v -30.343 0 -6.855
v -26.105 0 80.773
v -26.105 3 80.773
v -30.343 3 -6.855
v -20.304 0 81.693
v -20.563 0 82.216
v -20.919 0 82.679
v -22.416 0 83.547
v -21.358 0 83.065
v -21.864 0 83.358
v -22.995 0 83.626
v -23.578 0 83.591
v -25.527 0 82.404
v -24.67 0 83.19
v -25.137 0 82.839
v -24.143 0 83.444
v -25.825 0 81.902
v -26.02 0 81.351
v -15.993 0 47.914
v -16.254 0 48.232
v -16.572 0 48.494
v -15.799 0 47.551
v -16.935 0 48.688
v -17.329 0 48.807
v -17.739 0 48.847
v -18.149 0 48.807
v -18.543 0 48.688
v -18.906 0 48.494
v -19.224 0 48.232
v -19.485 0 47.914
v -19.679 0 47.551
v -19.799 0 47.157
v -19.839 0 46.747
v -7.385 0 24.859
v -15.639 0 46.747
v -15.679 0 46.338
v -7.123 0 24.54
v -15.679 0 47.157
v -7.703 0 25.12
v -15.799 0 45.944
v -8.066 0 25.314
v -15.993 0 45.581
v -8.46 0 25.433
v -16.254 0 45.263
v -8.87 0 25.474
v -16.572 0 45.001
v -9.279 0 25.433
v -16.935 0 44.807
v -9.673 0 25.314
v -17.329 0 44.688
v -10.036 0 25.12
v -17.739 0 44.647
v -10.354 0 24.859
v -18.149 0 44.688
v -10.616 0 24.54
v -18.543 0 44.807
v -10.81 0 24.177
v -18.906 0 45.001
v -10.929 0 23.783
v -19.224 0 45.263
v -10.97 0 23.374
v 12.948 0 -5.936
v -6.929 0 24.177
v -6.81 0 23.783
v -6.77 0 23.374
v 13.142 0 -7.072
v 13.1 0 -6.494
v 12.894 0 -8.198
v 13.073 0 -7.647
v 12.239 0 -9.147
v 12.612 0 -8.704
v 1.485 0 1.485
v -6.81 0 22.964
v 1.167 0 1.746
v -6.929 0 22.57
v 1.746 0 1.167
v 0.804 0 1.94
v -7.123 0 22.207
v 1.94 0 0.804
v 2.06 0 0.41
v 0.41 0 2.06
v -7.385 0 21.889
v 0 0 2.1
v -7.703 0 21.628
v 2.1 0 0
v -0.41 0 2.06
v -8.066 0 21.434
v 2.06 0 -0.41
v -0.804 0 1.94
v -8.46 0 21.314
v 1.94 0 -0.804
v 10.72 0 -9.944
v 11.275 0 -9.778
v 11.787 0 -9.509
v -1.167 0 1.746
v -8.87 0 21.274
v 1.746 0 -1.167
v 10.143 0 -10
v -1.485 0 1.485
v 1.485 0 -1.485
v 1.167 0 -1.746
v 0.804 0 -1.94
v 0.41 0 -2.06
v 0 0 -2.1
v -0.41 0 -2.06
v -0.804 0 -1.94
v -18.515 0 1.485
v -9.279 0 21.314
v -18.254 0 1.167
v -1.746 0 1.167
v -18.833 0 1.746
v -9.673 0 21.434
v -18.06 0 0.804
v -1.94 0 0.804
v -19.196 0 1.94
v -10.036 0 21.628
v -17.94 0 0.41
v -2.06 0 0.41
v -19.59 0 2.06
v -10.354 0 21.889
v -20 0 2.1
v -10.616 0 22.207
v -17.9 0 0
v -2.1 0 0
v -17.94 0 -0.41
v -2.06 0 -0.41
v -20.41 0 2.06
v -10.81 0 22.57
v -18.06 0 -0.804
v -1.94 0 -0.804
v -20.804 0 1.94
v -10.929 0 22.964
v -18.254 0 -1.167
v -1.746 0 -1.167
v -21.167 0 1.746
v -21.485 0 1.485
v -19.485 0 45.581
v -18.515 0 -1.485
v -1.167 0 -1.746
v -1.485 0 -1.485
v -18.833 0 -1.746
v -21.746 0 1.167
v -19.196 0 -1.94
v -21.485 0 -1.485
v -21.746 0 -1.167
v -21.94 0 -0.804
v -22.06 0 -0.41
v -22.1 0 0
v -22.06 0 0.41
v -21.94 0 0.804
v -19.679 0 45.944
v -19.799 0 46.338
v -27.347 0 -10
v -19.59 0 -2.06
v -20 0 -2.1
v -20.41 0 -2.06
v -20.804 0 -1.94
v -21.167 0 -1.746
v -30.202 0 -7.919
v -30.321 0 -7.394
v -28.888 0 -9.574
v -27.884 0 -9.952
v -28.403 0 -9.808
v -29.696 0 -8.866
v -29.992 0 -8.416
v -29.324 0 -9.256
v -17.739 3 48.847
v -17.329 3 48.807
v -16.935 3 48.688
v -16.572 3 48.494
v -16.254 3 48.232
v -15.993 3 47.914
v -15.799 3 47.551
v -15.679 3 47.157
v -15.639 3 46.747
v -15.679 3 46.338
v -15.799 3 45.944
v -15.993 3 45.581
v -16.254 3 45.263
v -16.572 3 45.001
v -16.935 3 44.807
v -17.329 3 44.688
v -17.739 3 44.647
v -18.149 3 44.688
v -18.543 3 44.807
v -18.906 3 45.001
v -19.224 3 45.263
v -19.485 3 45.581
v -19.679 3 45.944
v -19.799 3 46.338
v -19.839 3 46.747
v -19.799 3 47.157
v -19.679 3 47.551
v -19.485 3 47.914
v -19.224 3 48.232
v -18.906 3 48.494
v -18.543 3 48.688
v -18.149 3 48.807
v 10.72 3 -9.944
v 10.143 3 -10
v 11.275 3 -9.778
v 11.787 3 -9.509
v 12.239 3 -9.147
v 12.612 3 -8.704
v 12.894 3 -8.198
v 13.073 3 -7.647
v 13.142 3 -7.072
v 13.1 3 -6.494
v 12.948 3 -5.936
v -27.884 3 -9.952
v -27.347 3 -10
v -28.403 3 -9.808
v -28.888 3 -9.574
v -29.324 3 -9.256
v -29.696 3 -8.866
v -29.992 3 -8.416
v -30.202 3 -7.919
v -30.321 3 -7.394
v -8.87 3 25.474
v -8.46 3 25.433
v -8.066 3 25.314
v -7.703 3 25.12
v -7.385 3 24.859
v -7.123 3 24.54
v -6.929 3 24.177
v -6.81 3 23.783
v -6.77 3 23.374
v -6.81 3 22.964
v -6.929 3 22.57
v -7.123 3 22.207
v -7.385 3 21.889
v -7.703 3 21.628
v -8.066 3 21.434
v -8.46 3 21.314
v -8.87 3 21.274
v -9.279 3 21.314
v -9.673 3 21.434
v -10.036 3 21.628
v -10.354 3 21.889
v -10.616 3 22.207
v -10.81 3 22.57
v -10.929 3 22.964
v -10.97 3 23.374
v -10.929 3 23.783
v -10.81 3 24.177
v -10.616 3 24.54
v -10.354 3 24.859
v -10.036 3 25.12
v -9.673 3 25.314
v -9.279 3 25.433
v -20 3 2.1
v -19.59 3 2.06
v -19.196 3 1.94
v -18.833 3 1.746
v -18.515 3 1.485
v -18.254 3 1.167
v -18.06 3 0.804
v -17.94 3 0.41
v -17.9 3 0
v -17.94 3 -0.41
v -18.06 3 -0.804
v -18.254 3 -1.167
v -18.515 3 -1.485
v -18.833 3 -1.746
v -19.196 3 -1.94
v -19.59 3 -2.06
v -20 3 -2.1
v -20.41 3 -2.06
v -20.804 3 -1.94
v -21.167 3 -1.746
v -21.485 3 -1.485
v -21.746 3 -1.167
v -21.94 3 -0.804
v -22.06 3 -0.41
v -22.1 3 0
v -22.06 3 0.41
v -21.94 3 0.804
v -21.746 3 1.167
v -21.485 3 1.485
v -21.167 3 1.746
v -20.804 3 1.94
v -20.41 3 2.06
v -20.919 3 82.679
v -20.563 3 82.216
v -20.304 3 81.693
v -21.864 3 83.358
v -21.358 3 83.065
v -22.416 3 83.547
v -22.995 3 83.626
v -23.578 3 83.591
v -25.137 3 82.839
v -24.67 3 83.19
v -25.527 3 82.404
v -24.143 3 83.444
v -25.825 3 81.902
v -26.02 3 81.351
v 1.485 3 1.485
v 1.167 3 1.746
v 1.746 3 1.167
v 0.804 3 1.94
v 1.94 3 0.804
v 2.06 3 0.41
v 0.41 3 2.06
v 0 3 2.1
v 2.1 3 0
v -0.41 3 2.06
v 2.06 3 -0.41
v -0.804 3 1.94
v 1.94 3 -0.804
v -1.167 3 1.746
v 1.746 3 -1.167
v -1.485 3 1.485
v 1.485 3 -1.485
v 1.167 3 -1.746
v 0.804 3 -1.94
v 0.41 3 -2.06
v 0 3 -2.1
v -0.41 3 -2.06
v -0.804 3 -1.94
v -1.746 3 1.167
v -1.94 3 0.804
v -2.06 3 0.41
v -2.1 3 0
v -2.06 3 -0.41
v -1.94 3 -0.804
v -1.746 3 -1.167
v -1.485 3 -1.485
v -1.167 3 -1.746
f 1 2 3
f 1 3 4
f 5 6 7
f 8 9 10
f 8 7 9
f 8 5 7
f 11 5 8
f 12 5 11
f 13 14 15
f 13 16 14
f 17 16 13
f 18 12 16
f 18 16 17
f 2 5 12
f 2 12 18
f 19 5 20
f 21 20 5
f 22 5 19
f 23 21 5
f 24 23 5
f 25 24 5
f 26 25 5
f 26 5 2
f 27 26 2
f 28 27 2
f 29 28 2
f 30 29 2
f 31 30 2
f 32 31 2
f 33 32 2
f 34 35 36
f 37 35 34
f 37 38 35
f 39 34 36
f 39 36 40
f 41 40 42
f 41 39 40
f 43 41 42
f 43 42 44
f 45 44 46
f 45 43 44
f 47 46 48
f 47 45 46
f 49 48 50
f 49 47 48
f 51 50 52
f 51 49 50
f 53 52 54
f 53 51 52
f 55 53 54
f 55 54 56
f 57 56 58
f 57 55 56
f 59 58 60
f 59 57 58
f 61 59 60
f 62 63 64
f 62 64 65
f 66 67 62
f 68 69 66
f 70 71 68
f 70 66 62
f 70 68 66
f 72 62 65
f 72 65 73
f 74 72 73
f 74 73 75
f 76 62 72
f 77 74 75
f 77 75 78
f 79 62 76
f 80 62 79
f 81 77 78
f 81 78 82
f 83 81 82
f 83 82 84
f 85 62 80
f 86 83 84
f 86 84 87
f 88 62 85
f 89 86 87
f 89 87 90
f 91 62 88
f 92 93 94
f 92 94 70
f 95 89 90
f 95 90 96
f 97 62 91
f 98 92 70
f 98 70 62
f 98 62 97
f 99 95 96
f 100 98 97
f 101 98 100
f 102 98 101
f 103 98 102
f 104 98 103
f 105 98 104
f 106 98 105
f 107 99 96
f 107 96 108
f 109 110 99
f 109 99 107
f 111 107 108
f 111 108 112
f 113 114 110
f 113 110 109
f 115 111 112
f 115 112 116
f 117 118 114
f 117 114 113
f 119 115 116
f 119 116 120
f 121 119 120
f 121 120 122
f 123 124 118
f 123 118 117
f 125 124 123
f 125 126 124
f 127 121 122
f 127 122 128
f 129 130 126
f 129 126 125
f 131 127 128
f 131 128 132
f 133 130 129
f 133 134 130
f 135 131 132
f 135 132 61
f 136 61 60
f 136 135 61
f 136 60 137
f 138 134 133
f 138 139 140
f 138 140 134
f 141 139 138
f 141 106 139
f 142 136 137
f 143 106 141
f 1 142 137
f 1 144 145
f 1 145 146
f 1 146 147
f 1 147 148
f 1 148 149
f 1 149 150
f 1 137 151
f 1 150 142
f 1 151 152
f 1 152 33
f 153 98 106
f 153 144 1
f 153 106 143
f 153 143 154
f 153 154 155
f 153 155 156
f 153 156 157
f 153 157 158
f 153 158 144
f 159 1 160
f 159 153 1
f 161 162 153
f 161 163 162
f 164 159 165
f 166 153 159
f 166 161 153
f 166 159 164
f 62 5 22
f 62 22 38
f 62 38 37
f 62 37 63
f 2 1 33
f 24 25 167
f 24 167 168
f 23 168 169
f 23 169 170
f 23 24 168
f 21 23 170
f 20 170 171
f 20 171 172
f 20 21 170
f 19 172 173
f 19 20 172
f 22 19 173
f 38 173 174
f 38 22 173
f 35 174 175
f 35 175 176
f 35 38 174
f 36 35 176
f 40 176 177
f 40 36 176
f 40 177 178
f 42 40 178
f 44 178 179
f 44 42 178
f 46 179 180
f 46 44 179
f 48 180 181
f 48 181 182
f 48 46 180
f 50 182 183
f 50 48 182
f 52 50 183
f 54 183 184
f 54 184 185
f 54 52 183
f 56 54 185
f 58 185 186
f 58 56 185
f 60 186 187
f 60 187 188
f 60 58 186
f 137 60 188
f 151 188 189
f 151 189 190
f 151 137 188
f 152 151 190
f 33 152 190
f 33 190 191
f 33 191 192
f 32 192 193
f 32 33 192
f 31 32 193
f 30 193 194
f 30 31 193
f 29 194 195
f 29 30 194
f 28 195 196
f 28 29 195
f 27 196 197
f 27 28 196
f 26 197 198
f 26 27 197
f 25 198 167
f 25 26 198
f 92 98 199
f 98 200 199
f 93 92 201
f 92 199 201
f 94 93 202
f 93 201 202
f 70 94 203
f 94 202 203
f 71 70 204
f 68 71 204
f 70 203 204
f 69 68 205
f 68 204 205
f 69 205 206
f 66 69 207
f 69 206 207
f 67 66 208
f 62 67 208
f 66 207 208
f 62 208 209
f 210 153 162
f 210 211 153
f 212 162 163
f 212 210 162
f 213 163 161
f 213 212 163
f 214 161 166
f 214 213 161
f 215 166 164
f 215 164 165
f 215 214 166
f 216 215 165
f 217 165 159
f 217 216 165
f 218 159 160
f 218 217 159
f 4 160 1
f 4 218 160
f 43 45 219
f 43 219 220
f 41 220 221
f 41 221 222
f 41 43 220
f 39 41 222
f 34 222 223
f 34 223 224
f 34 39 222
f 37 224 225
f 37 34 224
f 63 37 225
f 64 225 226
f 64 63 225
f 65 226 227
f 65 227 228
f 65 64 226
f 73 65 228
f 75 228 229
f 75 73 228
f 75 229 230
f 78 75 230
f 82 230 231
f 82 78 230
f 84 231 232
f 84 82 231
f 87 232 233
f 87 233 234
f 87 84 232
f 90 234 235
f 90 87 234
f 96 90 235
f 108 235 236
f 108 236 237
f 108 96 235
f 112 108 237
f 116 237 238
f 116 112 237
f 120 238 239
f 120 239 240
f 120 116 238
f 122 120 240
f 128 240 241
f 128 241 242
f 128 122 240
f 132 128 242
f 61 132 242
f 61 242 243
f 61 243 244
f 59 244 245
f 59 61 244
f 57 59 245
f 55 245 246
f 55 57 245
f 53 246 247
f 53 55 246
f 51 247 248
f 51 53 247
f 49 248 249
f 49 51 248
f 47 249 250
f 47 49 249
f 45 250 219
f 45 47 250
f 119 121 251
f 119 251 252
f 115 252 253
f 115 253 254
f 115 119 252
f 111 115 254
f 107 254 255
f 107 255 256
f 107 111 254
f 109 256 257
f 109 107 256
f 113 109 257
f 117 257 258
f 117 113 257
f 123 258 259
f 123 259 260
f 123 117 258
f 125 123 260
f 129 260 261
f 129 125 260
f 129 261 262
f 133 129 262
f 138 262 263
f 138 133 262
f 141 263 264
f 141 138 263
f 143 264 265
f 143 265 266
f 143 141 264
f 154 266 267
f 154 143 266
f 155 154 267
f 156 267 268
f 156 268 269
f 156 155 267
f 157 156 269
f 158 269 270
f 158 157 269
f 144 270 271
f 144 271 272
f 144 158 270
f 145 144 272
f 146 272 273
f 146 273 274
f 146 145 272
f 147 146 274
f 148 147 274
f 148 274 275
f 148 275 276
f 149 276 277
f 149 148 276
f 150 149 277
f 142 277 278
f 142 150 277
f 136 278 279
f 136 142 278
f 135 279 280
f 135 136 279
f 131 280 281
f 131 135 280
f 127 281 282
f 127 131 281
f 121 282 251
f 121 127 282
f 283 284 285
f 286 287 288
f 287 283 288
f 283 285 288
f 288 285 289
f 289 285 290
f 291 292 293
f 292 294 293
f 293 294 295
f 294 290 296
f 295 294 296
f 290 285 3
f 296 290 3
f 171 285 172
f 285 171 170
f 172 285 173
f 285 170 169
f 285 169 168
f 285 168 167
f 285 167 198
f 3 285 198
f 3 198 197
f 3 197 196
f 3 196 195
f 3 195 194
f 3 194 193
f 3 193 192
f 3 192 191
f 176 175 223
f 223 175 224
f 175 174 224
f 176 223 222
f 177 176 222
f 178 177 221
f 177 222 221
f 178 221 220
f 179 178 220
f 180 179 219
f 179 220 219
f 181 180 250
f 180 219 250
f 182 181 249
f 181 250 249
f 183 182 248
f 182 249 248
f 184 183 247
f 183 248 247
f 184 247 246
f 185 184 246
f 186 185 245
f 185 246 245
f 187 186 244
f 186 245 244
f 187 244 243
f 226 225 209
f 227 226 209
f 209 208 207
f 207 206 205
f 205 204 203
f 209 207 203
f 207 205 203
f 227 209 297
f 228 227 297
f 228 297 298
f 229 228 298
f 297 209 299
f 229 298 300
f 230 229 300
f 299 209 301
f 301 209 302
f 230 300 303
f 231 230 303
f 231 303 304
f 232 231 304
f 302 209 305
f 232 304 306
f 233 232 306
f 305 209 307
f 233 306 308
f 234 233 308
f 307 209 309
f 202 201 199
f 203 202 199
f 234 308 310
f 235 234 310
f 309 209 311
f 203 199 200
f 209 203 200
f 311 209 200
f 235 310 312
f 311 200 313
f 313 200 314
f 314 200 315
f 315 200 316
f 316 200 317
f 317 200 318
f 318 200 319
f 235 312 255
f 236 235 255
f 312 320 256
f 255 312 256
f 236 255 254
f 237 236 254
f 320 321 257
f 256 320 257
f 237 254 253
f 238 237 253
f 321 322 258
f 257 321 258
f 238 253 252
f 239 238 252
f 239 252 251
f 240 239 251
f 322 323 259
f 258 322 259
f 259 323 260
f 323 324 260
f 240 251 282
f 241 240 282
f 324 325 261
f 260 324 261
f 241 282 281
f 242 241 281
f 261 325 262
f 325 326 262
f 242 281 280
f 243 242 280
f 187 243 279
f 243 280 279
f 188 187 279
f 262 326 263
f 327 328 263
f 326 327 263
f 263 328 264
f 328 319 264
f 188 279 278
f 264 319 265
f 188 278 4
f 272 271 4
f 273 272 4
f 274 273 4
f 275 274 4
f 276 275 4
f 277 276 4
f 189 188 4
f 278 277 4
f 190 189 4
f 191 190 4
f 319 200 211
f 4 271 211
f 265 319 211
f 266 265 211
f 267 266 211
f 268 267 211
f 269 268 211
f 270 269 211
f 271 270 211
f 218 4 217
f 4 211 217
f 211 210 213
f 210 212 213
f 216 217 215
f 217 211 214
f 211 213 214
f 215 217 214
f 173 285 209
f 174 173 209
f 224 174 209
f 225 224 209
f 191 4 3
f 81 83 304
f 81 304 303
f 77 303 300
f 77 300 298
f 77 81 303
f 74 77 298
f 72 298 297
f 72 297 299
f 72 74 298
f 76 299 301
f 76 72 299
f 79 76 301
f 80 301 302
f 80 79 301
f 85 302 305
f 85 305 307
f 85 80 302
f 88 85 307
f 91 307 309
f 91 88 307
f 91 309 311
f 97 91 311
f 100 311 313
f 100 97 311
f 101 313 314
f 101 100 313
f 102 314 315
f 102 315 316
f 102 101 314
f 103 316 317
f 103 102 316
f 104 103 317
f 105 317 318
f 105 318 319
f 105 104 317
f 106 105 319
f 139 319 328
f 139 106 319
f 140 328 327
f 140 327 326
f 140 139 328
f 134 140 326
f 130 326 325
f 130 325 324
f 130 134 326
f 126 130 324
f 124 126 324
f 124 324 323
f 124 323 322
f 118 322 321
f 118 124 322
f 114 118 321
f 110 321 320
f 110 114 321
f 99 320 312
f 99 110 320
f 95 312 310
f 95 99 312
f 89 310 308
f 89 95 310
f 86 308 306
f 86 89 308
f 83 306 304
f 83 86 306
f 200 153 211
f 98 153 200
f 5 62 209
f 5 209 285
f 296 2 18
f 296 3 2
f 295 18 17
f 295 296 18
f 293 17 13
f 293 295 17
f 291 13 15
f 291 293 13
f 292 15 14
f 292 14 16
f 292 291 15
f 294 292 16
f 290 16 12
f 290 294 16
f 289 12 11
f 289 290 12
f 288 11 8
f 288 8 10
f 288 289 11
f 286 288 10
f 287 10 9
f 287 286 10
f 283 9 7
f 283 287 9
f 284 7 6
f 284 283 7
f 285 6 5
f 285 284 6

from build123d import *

# Parameters (mm, degrees)
SKETCH_1_R      = 2.1
EXTRUDE_1_DEPTH = 3
FILLET_1_R      = 3


with BuildPart() as part:
    # 草图1 → 凸台-拉伸1 (new body)
    with BuildSketch(Plane(origin=(0, 0, 0), x_dir=(1, 0, 0), z_dir=(0, 1, 0))):
        Polygon((-30.495345075, 10), (14.490413826, 10), (-25.409775328, -95.148540432), align=None)
        with Locations(Location((0, 0, 0), (0, 0, 270))):
            Circle(SKETCH_1_R, mode=Mode.SUBTRACT)
        with Locations(Location((-20, 0, 0), (0, 0, 270))):
            Circle(SKETCH_1_R, mode=Mode.SUBTRACT)
        with Locations(Location((-8.869515627, -23.373739379, 0), (0, 0, 270))):
            Circle(SKETCH_1_R, mode=Mode.SUBTRACT)
        with Locations(Location((-17.739031253, -46.747478758, 0), (0, 0, 270))):
            Circle(SKETCH_1_R, mode=Mode.SUBTRACT)
    extrude(amount=EXTRUDE_1_DEPTH)

    # 圆角1
    fillet_1_edges = [part.edges().sort_by_distance(p)[0] for p in [
        (-30.495345075, 1.5, -10),
        (14.490413826, 1.5, -10),
        (-25.409775328, 1.5, 95.148540432),
    ]]
    fillet(fillet_1_edges, radius=FILLET_1_R)


solid = part.part
